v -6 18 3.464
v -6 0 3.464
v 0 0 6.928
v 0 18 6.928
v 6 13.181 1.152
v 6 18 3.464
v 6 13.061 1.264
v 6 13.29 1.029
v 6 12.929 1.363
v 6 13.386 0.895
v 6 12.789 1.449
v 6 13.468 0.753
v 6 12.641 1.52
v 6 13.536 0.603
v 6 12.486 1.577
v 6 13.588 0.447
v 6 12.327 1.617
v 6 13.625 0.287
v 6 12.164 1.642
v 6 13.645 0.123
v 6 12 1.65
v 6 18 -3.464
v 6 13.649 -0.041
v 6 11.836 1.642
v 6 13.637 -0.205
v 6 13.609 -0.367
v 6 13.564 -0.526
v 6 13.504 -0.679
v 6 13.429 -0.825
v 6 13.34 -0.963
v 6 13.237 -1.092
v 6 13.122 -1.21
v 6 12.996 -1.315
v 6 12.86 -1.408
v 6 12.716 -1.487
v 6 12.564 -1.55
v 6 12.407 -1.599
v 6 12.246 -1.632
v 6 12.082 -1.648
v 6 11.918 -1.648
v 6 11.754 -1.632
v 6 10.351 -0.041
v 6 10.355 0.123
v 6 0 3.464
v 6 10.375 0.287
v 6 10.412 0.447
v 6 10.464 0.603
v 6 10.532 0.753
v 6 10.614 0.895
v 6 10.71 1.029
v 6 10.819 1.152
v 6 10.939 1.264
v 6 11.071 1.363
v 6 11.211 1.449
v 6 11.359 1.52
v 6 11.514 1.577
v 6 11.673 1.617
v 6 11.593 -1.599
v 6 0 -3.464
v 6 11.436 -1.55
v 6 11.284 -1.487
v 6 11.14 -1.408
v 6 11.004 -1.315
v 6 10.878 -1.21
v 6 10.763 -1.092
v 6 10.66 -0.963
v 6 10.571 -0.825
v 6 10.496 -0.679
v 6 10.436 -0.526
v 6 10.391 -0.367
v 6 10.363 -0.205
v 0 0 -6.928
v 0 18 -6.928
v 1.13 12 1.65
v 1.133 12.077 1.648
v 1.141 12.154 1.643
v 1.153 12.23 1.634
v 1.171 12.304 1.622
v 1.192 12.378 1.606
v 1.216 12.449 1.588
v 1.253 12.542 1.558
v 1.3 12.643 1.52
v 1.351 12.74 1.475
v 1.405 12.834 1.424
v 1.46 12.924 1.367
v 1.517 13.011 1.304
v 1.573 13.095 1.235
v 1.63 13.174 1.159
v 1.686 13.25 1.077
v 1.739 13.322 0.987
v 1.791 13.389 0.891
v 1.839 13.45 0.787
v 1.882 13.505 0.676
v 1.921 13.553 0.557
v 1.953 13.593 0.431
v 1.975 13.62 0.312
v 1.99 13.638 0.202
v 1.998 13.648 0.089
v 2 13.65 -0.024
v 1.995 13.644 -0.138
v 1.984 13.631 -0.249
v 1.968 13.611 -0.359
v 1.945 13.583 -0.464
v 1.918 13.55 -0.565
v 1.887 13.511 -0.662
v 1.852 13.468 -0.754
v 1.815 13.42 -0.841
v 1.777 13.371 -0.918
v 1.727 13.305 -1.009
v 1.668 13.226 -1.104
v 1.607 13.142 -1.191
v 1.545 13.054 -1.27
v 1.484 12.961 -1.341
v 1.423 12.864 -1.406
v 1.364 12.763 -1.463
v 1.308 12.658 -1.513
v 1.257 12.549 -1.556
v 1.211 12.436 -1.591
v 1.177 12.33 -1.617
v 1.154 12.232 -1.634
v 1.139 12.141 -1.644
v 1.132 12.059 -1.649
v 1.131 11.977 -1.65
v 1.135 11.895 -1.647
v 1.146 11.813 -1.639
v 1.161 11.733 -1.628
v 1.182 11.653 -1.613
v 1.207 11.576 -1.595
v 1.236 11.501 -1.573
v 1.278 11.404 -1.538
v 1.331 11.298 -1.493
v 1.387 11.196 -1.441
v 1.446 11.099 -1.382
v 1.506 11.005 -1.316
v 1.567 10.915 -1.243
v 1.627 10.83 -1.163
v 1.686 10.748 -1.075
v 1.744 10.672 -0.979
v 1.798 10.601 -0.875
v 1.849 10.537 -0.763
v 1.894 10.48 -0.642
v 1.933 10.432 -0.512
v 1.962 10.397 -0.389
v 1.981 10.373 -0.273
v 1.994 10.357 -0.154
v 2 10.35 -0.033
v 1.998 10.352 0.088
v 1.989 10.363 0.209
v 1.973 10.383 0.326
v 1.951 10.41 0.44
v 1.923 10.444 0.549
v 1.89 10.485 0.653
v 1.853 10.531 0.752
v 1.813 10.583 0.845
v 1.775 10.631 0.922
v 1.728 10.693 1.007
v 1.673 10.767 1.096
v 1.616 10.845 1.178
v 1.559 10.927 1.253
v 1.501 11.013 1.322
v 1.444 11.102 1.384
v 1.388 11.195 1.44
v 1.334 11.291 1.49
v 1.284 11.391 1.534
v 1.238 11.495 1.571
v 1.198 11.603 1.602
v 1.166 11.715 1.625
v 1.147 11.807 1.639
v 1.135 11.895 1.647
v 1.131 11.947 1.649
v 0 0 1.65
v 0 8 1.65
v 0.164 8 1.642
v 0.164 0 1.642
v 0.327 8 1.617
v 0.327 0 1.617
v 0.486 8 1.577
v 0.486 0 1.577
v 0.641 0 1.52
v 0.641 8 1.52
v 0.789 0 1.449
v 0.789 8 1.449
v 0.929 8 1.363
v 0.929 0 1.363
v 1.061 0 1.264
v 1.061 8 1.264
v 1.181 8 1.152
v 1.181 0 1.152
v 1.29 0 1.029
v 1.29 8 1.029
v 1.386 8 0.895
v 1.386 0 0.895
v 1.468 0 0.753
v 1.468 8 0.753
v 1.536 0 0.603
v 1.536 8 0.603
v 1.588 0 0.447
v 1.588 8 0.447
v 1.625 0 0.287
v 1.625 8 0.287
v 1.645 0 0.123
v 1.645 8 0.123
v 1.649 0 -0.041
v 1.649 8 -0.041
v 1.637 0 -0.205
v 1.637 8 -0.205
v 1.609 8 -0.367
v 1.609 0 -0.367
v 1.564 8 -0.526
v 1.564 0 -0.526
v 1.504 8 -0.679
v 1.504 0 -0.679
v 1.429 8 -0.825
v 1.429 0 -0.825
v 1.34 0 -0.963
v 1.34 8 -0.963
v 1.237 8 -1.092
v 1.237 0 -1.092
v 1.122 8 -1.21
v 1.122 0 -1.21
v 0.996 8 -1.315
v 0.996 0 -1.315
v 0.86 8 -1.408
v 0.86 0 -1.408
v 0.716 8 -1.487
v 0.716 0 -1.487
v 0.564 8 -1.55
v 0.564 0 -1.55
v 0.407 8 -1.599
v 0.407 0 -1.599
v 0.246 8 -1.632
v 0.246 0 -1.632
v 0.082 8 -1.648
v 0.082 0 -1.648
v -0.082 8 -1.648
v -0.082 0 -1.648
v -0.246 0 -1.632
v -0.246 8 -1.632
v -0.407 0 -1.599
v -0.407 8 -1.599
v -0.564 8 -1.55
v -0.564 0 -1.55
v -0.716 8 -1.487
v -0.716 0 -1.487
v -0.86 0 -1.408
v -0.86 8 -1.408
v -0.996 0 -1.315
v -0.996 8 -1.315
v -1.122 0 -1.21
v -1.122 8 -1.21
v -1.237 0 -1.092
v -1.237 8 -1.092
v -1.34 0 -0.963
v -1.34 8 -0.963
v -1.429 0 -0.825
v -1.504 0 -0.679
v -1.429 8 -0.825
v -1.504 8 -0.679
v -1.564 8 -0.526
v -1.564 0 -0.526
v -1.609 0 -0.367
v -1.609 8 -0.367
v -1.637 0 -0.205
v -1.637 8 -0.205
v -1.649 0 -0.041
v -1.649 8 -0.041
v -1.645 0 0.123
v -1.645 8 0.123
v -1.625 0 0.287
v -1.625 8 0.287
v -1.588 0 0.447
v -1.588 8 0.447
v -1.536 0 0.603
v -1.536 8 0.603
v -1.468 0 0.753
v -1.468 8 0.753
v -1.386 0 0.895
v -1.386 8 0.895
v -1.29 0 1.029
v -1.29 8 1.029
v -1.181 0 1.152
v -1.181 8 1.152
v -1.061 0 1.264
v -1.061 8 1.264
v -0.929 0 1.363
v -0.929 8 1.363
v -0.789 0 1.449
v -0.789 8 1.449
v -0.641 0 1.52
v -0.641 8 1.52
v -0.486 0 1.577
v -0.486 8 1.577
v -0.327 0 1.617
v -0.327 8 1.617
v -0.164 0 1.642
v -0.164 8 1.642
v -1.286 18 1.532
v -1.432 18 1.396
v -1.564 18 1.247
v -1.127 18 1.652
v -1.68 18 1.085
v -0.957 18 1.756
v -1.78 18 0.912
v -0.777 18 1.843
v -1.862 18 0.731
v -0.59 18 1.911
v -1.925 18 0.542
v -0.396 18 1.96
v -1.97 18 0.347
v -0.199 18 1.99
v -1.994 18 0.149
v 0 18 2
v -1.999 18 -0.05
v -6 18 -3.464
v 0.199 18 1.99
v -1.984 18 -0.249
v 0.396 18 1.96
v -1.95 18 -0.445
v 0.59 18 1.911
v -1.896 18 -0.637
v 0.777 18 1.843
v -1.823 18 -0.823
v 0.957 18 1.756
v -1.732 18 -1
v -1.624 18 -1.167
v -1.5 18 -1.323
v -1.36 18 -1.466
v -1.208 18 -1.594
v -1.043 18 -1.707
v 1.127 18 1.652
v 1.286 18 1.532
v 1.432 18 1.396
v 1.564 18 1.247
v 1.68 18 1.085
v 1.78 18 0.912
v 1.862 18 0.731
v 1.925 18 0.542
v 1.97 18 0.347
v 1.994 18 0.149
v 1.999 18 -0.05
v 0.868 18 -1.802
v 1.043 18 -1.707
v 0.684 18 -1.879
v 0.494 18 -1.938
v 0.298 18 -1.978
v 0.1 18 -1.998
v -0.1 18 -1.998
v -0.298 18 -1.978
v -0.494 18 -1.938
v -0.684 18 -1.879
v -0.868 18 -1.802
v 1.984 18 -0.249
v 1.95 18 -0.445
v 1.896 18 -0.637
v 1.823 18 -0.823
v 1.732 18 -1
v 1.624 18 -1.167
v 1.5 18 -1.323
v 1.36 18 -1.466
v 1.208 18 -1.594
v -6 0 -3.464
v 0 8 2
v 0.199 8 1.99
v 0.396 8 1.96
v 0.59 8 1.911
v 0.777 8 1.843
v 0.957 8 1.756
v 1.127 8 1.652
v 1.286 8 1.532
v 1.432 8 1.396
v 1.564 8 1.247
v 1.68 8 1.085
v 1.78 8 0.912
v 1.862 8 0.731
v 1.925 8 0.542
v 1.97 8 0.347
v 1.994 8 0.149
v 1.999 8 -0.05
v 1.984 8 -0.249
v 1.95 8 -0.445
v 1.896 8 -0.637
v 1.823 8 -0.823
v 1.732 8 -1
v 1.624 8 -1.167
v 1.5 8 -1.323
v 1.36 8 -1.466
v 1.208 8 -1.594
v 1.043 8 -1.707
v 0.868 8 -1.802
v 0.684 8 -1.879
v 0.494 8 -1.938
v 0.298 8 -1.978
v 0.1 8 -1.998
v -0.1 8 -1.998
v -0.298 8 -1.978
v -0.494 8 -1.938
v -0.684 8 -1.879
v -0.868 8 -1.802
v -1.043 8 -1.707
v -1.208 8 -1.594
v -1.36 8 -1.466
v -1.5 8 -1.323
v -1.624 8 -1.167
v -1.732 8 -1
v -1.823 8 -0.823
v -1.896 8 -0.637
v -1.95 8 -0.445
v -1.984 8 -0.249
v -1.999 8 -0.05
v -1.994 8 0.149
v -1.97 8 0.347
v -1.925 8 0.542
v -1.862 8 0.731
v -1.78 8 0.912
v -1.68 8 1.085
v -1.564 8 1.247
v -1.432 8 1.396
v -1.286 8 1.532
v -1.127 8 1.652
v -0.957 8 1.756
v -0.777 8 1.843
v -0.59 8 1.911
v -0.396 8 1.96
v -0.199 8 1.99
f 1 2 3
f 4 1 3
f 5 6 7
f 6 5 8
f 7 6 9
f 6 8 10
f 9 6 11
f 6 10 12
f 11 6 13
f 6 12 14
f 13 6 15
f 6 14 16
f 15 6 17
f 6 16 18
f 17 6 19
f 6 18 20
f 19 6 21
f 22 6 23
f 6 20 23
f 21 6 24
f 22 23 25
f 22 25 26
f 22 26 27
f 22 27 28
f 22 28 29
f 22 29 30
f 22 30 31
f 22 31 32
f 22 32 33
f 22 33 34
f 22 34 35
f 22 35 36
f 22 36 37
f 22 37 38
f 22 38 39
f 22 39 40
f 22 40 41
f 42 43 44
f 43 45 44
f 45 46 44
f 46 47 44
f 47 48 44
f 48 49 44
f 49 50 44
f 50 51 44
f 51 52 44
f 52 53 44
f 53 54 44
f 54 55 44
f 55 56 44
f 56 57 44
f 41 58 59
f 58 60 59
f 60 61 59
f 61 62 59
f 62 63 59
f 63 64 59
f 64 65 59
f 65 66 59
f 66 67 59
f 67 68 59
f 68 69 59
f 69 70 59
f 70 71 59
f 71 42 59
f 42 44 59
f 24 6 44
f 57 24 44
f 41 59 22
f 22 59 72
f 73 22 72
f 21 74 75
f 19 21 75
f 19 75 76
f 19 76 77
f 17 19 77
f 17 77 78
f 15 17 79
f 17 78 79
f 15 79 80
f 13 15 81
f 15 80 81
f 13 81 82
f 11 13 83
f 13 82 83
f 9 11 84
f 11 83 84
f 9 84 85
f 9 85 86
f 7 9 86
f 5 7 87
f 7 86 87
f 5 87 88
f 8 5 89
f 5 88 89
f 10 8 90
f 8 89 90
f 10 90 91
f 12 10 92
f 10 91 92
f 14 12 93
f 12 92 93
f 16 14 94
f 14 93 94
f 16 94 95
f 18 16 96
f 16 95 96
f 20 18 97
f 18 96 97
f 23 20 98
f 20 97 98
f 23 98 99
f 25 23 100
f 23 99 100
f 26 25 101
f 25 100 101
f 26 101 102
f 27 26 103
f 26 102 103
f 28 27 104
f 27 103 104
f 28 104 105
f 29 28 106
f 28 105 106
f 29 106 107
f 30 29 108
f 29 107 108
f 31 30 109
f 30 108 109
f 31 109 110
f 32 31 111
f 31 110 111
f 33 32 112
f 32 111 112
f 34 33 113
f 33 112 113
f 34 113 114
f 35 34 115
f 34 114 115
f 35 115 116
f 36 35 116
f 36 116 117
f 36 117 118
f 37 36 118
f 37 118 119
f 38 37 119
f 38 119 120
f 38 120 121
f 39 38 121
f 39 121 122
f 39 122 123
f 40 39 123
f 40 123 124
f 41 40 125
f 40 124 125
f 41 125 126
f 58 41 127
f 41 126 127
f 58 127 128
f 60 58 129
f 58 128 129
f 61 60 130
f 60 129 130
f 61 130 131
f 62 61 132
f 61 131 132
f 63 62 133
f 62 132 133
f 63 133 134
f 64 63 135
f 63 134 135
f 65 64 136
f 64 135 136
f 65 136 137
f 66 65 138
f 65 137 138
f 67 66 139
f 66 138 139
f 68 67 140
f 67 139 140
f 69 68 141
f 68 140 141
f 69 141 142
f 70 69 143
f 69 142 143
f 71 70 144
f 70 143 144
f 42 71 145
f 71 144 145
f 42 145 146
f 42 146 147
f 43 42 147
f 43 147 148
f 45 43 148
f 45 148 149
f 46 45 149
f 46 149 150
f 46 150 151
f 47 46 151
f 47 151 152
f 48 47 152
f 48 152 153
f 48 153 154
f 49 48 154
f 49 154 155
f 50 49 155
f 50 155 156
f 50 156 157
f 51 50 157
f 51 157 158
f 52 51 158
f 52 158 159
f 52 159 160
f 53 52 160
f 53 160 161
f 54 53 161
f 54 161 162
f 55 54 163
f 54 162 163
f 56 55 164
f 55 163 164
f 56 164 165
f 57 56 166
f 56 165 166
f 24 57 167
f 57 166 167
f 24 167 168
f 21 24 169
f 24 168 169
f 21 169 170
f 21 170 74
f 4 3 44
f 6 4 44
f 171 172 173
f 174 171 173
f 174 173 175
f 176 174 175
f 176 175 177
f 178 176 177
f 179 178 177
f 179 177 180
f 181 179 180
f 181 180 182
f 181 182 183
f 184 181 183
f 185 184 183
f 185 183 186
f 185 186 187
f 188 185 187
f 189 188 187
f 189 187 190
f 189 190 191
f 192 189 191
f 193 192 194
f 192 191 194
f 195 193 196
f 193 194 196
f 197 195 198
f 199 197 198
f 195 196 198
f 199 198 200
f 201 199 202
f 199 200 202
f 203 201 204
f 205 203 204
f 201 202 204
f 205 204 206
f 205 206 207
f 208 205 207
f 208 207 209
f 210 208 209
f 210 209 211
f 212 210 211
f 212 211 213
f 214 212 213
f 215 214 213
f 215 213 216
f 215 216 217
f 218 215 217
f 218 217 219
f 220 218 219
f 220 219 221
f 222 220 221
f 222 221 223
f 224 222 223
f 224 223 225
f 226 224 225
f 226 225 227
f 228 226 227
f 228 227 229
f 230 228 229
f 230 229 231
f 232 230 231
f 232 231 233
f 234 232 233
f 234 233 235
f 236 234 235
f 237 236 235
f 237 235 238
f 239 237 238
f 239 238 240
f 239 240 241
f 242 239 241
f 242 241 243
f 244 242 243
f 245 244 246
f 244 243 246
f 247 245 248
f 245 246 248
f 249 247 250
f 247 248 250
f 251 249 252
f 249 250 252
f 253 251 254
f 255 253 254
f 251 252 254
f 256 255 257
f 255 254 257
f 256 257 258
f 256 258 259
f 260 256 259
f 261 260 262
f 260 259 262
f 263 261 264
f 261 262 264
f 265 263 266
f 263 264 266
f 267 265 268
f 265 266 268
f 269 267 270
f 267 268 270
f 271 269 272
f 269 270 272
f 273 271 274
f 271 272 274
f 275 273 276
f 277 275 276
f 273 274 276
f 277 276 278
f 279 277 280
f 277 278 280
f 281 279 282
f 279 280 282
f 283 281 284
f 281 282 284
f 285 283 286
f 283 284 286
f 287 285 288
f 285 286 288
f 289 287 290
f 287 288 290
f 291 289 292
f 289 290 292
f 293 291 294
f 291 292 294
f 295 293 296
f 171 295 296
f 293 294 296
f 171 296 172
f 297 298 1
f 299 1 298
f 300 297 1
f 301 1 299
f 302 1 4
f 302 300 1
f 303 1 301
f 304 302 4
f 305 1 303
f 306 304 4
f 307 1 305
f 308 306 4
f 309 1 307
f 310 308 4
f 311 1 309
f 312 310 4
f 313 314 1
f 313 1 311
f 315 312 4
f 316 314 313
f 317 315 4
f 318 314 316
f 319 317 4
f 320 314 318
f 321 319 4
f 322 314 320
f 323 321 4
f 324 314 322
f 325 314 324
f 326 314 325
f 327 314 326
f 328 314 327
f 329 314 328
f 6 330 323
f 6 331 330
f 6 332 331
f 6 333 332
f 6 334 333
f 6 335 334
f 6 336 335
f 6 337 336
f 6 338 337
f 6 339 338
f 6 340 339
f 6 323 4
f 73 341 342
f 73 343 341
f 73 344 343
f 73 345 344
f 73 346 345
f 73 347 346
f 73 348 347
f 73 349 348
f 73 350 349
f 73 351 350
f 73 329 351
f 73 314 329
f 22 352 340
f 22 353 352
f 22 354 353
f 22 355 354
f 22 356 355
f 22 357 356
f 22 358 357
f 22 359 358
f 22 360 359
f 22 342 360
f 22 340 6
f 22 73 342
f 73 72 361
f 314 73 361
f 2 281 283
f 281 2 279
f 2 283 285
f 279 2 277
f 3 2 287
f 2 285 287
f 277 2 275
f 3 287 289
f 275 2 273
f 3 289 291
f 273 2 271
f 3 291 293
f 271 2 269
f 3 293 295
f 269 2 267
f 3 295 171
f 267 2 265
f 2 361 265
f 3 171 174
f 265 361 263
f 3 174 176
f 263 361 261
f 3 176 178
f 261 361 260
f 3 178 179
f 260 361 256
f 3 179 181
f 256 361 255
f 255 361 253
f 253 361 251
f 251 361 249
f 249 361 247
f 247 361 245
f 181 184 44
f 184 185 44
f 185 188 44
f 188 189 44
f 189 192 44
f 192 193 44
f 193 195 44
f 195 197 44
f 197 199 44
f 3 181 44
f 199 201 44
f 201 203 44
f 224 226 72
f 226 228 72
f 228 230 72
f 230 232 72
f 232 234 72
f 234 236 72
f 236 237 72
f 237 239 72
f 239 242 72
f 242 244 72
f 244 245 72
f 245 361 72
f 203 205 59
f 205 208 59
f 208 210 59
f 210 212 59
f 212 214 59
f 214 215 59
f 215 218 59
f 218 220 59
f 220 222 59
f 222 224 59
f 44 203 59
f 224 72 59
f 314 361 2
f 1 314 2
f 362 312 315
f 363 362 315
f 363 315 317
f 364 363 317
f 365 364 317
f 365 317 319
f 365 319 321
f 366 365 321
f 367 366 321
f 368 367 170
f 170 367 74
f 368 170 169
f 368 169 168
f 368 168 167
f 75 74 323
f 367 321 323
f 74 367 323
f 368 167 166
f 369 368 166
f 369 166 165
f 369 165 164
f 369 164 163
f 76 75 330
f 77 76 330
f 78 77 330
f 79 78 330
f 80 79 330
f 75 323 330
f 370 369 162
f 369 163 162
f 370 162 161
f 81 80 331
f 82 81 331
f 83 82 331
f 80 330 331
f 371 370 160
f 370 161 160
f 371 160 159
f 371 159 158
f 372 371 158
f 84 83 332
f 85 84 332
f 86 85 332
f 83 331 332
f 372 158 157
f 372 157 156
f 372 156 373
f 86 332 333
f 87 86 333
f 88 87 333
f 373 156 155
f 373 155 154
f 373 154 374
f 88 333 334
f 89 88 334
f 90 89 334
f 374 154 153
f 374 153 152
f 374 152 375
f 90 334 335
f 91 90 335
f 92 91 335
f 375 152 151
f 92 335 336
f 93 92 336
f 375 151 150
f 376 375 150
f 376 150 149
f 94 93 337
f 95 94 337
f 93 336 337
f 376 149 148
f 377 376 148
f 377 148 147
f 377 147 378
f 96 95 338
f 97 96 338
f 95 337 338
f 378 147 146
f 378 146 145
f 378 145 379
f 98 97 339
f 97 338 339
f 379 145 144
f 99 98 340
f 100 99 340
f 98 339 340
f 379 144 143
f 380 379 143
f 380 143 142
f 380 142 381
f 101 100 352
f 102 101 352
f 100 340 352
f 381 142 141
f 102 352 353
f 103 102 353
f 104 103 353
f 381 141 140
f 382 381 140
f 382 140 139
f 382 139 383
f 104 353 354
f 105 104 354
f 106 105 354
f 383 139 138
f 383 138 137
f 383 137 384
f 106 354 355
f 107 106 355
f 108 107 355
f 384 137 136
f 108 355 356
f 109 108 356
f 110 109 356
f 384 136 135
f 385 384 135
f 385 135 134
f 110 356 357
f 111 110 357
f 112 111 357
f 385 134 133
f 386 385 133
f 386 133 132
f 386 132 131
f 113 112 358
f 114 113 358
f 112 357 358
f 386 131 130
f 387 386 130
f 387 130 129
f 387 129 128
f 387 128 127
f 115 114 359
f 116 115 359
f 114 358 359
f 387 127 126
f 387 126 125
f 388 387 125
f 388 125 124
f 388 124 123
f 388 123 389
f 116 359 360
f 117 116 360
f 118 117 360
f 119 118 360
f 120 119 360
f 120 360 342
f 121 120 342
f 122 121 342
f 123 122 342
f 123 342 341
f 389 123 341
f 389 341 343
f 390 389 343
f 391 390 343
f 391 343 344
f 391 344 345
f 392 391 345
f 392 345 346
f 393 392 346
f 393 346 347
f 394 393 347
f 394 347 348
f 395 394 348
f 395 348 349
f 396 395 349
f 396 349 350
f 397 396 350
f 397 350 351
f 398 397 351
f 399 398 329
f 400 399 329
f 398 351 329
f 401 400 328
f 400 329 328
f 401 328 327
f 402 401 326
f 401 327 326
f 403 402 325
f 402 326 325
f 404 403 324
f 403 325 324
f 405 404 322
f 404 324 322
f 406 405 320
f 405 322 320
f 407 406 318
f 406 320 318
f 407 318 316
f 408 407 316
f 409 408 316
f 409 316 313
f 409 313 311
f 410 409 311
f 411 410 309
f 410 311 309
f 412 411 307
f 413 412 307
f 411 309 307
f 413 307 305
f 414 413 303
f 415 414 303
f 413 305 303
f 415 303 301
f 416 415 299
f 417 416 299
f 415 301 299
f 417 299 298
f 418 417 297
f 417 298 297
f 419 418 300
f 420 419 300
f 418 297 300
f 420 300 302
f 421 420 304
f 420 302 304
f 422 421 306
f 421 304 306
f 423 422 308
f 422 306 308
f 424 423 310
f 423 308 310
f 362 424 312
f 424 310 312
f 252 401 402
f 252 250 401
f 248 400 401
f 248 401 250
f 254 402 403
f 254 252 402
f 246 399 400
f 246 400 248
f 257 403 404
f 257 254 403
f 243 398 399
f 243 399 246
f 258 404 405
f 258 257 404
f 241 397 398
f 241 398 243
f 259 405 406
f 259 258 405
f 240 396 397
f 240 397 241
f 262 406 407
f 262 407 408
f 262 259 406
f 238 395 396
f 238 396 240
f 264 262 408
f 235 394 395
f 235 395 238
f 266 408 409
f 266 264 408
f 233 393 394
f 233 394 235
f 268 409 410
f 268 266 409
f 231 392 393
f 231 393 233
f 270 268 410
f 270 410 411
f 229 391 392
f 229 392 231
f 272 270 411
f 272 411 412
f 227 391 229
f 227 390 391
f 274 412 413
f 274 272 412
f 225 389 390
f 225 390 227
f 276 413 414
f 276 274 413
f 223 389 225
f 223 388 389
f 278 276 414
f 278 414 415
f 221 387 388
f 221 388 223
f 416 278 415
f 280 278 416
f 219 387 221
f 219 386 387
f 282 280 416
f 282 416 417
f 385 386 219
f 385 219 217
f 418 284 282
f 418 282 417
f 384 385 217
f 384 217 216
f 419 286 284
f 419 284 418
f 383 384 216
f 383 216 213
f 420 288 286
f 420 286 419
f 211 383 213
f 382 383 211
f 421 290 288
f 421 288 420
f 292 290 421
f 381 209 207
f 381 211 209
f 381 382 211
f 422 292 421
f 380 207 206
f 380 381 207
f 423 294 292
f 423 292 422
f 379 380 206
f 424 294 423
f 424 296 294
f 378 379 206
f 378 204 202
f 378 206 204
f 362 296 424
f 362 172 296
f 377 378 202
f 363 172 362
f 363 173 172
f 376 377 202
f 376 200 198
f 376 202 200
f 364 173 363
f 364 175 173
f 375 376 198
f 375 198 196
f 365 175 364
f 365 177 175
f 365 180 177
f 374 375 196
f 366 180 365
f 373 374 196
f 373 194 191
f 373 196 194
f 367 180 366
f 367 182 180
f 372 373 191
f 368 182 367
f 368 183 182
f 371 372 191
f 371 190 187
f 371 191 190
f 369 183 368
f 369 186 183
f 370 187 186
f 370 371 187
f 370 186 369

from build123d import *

# Parameters (mm, degrees)
BOSS_EXTRU_1_DEPTH                           = 18
ESQUISSE2_R                                  = 2
ENL_V_MAT_EXTRU_1_DEPTH                      = 10
TROU_POUR_TARAUDAGE_POUR_TROU_TARAUD_M4_D    = 3.3
TROU_POUR_TARAUDAGE_POUR_TROU_TARAUD_2_D     = 3.3
TROU_POUR_TARAUDAGE_POUR_TROU_TARAUD_2_DEPTH = 7


with BuildPart() as part:
    # Esquisse1 → Boss.-Extru.1 (new body)
    with BuildSketch(Plane(origin=(0, 0, 0), x_dir=(1, 0, 0), z_dir=(0, 1, 0))):
        Polygon((-6, -3.464101615), (0, -6.92820323), (6, -3.464101615), (6, 3.464101615), (0, 6.92820323), (-6, 3.464101615), align=None)
    extrude(amount=BOSS_EXTRU_1_DEPTH)

    # Esquisse2 → Enlèv. mat.-Extru.1 (cut)
    with BuildSketch(Plane(origin=(0, 18, 0), x_dir=(1, 0, 0), z_dir=(0, 1, 0))):
        with Locations(Location((0, 0, 0), (0, 0, 270))):
            Circle(ESQUISSE2_R)
    extrude(amount=-ENL_V_MAT_EXTRU_1_DEPTH, mode=Mode.SUBTRACT)

    # Trou pour taraudage pour trou taraud_ M4 (through all)
    with Locations(Plane(origin=(0, 0, 0), x_dir=(0, 0, -1), z_dir=(0, -1, 0))):
        with Locations((0, 0)):
            Hole(TROU_POUR_TARAUDAGE_POUR_TROU_TARAUD_M4_D / 2)

    # Trou pour taraudage pour trou taraud 2
    with Locations(Plane(origin=(6, 0, 0), x_dir=(0, 0, -1), z_dir=(1, 0, 0))):
        with Locations((0, 12)):
            Hole(TROU_POUR_TARAUDAGE_POUR_TROU_TARAUD_2_D / 2, depth=TROU_POUR_TARAUDAGE_POUR_TROU_TARAUD_2_DEPTH)


solid = part.part
